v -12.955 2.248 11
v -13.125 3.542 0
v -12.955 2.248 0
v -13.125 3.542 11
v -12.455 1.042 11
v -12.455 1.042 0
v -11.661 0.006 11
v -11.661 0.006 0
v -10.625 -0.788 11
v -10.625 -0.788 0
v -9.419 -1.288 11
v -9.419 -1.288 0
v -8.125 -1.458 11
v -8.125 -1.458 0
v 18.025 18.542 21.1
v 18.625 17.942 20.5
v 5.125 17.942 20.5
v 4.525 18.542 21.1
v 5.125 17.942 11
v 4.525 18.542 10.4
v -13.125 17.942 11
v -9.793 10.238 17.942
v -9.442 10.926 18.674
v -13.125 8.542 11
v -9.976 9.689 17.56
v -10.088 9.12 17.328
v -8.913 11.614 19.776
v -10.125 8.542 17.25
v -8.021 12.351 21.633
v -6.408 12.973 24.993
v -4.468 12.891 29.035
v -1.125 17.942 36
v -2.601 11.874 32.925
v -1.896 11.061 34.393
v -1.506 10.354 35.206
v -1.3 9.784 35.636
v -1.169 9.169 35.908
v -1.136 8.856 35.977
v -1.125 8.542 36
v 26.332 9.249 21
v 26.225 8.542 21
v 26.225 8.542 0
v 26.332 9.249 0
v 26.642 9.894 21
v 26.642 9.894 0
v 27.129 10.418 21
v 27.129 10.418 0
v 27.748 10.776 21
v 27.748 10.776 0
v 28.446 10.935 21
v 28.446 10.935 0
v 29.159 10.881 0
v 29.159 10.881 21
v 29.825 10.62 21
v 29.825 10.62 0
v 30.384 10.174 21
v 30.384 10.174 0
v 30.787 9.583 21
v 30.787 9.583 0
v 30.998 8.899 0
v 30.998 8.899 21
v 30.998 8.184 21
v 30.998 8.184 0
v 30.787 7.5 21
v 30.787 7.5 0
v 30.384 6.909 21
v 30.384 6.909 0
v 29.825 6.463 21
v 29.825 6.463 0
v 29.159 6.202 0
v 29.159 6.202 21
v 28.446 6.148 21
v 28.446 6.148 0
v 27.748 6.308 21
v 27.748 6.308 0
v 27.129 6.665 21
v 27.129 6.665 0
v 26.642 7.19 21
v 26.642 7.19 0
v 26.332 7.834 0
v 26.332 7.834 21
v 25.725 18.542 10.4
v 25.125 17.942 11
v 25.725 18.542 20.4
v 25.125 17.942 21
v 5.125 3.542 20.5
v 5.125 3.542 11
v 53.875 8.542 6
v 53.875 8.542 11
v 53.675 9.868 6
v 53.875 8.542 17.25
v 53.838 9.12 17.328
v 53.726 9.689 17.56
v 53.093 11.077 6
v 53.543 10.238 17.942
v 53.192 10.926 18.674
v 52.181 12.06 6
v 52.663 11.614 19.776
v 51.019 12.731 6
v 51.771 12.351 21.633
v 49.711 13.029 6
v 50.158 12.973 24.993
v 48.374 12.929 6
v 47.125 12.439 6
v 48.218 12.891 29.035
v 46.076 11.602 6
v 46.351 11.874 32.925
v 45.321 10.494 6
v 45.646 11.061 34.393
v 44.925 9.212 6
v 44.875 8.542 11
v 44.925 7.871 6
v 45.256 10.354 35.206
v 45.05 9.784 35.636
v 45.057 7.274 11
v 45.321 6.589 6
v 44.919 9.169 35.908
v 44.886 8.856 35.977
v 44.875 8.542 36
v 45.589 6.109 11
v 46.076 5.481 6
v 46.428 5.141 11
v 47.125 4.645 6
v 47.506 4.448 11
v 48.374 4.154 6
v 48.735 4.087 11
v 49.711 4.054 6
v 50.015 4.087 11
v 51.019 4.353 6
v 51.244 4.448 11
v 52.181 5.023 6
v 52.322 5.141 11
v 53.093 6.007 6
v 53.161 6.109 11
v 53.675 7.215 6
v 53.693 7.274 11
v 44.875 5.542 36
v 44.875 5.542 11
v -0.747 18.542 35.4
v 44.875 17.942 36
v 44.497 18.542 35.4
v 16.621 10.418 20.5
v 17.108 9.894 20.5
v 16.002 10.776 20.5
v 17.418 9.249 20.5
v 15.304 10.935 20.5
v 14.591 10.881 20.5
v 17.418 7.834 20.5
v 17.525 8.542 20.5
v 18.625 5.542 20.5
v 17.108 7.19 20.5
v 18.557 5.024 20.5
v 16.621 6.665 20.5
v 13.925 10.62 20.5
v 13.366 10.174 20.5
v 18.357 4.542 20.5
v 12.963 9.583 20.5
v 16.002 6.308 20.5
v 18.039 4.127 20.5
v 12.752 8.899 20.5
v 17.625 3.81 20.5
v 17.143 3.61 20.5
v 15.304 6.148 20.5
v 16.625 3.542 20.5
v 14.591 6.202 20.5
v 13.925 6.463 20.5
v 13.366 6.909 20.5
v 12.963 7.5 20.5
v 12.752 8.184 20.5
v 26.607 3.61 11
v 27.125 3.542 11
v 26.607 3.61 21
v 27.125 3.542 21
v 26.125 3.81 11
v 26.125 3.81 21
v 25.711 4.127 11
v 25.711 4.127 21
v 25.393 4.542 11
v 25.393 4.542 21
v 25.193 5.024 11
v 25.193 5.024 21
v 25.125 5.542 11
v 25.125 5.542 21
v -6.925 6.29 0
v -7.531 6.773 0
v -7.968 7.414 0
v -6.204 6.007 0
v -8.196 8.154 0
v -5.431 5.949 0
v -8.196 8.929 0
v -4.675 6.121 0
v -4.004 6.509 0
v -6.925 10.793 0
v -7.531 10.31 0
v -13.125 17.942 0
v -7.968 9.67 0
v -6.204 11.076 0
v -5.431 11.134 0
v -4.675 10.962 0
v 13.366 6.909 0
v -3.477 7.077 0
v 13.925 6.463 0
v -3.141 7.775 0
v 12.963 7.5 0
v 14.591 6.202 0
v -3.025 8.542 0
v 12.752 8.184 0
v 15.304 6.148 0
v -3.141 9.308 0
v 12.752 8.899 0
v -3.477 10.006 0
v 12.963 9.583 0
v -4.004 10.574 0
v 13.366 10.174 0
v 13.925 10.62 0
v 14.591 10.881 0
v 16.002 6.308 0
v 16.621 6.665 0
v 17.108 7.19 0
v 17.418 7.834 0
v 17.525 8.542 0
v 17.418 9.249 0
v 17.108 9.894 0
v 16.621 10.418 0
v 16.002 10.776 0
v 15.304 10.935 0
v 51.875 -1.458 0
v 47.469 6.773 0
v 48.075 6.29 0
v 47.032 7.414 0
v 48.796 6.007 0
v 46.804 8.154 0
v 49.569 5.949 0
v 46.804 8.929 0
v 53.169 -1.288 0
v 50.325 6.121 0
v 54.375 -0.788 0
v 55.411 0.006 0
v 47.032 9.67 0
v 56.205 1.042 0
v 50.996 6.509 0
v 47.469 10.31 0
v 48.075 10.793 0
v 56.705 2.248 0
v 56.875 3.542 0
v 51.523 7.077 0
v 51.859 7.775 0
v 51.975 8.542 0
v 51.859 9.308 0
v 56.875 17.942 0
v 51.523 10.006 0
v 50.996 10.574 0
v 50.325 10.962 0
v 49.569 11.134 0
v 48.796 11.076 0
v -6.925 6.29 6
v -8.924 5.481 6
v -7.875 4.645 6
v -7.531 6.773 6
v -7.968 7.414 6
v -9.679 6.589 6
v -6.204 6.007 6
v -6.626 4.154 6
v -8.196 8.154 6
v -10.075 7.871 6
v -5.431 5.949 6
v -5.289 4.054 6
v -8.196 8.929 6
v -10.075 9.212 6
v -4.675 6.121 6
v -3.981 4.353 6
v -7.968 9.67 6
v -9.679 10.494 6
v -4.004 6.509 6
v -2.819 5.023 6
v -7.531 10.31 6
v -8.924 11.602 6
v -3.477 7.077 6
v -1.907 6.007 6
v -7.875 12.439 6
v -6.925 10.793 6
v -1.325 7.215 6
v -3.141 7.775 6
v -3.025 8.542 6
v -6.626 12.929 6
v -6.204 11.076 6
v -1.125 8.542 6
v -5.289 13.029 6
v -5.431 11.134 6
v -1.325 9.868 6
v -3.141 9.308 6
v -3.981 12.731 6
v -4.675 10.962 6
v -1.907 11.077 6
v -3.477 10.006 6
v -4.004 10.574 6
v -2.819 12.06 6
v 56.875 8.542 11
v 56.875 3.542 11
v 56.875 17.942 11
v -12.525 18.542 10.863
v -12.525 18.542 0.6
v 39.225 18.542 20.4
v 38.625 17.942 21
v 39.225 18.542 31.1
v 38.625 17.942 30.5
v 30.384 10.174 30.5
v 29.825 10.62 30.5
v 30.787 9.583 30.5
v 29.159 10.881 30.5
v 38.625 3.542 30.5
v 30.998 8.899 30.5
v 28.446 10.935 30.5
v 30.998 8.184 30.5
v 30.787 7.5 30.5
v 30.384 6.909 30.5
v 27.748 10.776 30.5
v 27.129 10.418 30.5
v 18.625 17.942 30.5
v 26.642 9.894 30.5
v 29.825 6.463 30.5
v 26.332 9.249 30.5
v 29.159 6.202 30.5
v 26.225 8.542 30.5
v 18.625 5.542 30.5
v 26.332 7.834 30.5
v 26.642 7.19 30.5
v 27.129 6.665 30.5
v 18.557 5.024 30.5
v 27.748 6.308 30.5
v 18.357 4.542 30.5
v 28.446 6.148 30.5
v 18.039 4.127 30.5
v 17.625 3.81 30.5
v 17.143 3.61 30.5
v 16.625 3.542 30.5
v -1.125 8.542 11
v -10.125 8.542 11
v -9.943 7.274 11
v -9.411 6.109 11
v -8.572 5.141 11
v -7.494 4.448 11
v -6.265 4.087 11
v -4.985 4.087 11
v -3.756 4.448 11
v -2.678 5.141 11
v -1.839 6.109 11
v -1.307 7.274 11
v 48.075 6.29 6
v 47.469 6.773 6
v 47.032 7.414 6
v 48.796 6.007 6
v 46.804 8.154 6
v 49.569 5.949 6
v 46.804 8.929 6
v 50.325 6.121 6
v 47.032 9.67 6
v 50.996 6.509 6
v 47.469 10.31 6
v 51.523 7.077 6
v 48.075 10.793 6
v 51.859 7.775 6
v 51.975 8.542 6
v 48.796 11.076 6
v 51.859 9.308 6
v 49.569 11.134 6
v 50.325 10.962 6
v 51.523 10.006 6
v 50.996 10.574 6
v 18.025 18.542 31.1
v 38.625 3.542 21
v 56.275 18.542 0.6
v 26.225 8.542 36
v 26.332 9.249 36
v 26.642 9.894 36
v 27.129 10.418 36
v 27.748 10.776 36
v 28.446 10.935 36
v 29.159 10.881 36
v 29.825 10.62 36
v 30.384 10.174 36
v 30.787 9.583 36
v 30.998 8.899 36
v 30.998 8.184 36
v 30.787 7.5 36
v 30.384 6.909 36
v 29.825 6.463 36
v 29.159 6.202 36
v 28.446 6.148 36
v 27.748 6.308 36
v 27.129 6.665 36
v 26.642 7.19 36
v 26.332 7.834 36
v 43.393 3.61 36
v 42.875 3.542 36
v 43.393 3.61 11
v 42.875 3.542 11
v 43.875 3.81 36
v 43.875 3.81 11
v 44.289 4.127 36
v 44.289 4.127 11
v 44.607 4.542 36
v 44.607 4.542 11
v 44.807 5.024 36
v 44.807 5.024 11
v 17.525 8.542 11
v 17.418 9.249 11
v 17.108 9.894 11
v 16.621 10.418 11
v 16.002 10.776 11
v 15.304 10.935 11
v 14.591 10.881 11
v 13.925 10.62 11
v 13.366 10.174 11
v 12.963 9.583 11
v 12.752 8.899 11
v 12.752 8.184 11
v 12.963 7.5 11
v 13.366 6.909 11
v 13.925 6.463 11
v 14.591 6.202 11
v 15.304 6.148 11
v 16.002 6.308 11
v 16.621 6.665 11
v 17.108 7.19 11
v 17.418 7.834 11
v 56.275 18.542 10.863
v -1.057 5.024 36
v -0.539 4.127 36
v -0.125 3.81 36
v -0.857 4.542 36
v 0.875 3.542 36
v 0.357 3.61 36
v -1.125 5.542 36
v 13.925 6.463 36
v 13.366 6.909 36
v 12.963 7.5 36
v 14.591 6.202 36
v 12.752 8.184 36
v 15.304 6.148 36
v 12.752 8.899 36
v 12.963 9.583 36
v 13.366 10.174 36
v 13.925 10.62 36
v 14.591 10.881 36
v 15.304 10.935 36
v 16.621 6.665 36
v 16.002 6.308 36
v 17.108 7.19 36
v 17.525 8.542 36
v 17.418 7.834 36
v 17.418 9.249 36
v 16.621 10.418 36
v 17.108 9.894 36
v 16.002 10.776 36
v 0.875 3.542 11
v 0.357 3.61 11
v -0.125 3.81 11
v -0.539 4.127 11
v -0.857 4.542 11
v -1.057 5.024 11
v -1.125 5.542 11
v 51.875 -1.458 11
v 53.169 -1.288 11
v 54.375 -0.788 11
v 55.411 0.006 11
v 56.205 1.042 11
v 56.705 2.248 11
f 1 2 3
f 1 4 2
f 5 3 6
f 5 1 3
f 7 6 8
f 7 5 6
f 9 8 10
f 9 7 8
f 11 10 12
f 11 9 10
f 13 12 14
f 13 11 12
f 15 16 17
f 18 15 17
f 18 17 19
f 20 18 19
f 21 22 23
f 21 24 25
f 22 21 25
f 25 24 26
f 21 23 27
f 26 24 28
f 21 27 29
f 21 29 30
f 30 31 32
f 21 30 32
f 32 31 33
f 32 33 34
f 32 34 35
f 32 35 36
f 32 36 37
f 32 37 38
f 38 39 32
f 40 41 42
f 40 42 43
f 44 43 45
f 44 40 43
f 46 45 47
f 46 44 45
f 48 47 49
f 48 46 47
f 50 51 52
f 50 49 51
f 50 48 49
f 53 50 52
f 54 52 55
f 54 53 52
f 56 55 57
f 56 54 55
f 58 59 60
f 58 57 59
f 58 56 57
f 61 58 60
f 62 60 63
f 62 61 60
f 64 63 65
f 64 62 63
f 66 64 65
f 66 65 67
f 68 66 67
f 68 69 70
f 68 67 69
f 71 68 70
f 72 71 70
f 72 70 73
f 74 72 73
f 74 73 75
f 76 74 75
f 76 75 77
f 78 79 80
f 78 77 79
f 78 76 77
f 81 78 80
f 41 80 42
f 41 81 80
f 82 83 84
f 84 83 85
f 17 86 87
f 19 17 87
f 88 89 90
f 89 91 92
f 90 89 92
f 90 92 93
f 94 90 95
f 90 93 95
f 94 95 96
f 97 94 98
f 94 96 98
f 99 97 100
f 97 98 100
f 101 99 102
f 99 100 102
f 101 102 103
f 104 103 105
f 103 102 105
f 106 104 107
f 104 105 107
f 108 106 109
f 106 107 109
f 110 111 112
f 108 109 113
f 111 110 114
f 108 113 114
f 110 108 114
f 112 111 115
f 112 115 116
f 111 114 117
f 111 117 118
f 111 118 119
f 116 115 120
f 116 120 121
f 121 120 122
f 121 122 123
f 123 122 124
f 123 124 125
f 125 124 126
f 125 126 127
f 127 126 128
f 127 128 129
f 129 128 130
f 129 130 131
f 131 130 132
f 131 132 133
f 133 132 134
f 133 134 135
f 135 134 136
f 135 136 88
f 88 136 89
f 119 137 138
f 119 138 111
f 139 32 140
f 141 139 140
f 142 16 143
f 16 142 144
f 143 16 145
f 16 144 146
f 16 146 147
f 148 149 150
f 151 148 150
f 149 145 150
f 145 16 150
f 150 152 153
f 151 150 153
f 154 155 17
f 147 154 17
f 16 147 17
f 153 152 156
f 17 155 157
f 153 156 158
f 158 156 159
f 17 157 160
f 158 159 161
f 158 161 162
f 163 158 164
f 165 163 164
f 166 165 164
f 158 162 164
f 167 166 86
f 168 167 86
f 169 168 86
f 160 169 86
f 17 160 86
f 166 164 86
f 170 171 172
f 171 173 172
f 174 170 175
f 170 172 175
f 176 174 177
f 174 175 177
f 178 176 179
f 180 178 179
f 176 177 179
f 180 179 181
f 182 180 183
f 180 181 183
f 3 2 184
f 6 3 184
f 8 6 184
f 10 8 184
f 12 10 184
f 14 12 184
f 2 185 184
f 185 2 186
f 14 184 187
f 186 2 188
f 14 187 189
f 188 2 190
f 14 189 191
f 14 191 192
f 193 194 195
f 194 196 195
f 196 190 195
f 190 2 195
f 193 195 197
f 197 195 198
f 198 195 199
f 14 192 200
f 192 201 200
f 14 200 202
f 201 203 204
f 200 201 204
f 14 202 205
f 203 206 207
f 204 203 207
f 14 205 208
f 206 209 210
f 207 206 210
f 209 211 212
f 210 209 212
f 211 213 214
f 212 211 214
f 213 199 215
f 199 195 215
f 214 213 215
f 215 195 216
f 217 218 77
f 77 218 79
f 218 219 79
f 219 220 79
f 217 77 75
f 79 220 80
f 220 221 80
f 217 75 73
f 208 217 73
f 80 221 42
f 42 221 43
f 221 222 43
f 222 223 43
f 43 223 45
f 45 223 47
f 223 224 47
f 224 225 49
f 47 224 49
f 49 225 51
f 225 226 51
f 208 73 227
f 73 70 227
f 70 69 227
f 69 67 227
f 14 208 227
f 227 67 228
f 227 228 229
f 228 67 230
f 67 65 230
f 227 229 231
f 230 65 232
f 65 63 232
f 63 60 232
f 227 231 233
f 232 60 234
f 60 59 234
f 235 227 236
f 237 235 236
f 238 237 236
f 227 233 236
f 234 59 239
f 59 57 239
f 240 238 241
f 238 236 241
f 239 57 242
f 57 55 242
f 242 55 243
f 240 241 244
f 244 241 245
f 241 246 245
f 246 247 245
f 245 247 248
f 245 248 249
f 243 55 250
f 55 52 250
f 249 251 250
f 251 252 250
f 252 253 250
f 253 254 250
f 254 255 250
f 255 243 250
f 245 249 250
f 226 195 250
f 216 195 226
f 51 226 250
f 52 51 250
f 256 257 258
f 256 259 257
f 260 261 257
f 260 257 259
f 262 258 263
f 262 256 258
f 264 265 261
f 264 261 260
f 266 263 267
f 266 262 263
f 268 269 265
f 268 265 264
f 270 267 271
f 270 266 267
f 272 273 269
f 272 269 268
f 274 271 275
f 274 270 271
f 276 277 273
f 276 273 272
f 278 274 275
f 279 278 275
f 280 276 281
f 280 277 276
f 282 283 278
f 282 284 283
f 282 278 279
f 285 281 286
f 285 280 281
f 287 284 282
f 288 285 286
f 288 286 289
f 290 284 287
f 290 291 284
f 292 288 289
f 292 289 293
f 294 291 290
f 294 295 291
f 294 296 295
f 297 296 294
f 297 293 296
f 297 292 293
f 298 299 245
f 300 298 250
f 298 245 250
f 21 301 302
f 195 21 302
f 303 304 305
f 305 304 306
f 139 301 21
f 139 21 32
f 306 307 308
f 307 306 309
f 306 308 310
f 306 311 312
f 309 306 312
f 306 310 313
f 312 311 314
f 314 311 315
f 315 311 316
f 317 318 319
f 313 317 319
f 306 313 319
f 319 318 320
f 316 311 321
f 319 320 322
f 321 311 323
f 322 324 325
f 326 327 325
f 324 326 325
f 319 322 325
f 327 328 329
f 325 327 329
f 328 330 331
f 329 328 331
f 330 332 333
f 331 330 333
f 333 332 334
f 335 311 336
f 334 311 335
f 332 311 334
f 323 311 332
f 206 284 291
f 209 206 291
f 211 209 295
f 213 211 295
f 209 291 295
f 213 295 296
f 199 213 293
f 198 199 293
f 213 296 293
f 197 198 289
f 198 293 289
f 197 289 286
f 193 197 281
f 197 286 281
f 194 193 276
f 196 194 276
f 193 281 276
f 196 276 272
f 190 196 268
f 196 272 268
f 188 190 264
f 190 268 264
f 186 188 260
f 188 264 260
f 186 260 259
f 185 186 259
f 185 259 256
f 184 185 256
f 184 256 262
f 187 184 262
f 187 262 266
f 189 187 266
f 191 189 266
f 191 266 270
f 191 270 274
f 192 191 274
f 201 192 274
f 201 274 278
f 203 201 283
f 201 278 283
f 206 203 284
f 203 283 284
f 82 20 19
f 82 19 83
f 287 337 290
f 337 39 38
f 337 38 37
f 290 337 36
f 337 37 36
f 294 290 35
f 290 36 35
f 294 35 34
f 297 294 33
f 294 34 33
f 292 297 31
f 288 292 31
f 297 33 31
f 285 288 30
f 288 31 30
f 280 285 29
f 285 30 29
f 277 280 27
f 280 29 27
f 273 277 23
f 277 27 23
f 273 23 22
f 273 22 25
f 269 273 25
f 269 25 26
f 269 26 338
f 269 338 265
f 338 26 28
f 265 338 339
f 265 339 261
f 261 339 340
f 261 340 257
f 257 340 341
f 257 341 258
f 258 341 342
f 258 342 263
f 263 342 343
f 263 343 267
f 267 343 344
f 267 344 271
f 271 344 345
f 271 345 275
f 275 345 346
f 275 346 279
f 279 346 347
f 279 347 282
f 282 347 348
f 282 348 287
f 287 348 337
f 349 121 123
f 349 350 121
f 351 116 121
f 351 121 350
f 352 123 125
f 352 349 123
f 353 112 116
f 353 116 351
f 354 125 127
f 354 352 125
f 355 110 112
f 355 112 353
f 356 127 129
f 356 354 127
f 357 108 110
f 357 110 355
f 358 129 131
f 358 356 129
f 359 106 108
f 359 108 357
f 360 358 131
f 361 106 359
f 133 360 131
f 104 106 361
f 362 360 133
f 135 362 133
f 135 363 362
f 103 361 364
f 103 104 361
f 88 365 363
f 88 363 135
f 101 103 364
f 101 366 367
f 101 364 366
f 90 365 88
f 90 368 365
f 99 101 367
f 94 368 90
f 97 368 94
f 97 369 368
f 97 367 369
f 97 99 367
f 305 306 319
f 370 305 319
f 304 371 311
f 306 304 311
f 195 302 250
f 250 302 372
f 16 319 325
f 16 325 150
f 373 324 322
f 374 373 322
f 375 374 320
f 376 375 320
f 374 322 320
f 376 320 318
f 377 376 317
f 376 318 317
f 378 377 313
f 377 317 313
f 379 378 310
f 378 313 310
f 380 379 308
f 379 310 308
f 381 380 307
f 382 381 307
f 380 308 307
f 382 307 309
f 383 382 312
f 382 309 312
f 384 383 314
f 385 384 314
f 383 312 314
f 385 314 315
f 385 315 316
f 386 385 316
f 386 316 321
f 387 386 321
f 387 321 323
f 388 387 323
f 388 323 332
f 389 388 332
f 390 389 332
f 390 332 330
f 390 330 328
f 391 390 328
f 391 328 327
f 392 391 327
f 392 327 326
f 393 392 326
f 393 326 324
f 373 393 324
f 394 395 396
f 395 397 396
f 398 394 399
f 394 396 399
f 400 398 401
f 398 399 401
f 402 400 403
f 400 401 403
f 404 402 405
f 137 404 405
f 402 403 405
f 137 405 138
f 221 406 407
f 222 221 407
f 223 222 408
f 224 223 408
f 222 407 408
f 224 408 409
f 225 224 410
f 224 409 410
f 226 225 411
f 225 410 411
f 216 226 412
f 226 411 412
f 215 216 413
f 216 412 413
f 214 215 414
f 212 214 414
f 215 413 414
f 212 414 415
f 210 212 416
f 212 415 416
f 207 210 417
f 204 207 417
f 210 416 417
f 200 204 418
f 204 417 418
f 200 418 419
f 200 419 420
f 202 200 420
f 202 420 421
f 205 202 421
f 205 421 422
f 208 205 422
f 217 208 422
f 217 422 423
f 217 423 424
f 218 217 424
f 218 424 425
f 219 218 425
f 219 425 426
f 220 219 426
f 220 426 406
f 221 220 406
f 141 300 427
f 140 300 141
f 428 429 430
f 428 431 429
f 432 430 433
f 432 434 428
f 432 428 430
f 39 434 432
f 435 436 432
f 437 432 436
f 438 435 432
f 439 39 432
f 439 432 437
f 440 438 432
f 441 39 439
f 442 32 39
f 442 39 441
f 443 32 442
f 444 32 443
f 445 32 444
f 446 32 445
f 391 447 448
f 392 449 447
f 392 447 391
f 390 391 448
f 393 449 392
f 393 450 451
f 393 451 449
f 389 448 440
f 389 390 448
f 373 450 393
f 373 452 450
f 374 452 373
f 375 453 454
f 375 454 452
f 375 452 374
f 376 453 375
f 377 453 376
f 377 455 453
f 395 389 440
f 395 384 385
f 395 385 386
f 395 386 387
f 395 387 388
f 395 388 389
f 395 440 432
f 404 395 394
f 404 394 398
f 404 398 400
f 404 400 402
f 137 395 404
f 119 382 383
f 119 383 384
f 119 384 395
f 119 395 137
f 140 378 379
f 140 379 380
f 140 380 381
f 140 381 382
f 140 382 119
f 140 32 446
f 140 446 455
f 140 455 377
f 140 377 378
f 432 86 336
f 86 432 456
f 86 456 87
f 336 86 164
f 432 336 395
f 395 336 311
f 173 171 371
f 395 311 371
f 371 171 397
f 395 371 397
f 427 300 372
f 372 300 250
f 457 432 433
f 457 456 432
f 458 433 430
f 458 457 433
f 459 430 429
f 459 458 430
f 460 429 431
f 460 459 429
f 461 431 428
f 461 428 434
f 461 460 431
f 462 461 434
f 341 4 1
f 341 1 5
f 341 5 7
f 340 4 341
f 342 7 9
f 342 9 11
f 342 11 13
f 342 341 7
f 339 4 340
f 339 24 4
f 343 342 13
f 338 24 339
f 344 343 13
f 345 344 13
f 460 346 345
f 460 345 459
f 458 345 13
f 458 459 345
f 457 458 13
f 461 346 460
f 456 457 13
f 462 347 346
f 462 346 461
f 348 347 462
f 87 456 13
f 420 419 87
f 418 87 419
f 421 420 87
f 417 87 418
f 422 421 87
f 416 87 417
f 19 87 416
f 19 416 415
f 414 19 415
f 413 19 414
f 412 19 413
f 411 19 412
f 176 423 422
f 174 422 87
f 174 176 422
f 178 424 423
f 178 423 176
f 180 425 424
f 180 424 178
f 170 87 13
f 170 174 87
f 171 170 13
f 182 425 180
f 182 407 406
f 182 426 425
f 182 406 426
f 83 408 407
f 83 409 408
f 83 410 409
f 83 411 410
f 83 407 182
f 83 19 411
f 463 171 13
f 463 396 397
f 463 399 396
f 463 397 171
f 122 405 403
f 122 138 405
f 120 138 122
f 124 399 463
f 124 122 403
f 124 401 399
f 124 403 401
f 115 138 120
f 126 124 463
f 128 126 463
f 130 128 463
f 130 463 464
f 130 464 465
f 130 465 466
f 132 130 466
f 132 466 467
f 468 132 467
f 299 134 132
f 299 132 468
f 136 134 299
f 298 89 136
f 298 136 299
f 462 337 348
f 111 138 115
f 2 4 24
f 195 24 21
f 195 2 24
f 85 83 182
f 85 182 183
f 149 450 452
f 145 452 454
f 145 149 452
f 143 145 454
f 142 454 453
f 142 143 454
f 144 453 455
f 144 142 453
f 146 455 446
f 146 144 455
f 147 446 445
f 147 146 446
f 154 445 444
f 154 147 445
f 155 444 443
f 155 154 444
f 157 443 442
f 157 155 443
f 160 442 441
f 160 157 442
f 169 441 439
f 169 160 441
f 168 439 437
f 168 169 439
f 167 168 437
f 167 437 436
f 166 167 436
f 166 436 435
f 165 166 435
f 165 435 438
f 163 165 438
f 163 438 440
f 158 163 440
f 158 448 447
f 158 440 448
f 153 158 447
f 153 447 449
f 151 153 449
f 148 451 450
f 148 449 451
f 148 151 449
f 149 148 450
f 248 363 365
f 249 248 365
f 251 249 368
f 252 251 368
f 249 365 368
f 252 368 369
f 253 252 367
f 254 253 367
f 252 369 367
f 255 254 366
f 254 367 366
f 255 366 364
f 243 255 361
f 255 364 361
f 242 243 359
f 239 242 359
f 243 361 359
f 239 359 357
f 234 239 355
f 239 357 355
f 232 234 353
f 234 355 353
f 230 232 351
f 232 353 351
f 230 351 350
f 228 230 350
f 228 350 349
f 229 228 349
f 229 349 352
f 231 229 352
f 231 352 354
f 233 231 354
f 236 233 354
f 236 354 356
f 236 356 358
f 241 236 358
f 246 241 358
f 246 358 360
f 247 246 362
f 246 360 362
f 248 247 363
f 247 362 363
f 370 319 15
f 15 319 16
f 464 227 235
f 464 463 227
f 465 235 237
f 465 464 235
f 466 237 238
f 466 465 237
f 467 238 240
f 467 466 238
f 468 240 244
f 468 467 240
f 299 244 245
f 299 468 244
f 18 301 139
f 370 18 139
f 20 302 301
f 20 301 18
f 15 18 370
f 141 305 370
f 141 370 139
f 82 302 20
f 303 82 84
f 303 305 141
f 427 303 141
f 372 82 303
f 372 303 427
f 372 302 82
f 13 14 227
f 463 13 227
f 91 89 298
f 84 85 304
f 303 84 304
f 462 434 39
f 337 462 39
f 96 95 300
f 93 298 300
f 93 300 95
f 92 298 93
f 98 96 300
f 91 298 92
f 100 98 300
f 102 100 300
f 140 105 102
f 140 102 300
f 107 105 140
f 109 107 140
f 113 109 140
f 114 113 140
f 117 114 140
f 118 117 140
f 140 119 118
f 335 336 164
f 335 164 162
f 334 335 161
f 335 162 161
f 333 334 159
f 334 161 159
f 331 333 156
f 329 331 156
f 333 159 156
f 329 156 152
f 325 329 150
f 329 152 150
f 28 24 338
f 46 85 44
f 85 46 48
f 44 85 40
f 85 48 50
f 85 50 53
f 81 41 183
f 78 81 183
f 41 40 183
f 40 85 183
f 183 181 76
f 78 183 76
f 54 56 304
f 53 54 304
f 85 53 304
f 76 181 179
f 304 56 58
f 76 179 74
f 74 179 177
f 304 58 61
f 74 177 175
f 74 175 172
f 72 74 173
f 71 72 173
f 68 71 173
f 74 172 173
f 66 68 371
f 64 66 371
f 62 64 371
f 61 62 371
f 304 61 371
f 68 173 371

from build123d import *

# Parameters (mm, degrees)
SKETCH_1_W               = 70
SKETCH_1_H               = 20
EXTRUDE_1_DEPTH          = 11
SKETCH_3_W               = 70
SKETCH_3_H               = 15
EXTRUDE_2_DEPTH          = 25
CUT_EXTRUDE_1_DEPTH      = 15
SKETCH_5_R               = 4.5
CUT_EXTRUDE_2_DEPTH      = 30
SKETCH_11_R              = 2.6
CUT_EXTRUDE_7_DEPTH      = 6
SKETCH_12_W              = 12
SKETCH_12_H              = 5
CUT_EXTRUDE_8_DEPTH      = 25
SKETCH_8_R               = 2.4
CUT_EXTRUDE_5_DEPTH      = 31.5
CUT_EXTRUDE_5_DEPTH_BACK = 6.5
SKETCH_10_R              = 2.4
CUT_EXTRUDE_6_DEPTH      = 26
CUT_EXTRUDE_6_DEPTH_BACK = 12
FILLET_1_R               = 5
CHAMFER_1_SIZE           = 0.6
FILLET_2_R               = 2


with BuildPart() as part:
    # 草图1 → 凸台-拉伸1 (new body)
    with BuildSketch(Plane.XY):
        with Locations((21.875, 8.541666667)):
            Rectangle(SKETCH_1_W, SKETCH_1_H)
    extrude(amount=EXTRUDE_1_DEPTH)

    # 草图3 → 凸台-拉伸2 (add)
    with BuildSketch(Plane.XY.offset(11)):
        with Locations((21.875, 11.041666667)):
            Rectangle(SKETCH_3_W, SKETCH_3_H)
    extrude(amount=EXTRUDE_2_DEPTH)

    # 草图4 → 切除-拉伸1 (cut)
    with BuildSketch(Plane.XZ.offset(-3.541666667)):
        Polygon((-13.125, 36), (-13.125, 11), (-1.125, 36), align=None)
        Polygon((56.875, 11), (44.875, 36), (56.875, 36), align=None)
        Polygon((5.125, 11), (25.125, 11), (25.125, 21), (38.625, 21), (38.625, 30.5), (18.625, 30.5), (18.625, 21), (18.625, 20.5), (5.125, 20.5), align=None)
    extrude(amount=-CUT_EXTRUDE_1_DEPTH, mode=Mode.SUBTRACT)

    # 草图5 → 切除-拉伸2 (cut)
    with BuildSketch(Plane.XY.offset(36)):
        with Locations((-5.625, 8.541666667)):
            Circle(SKETCH_5_R)
        with Locations((49.375, 8.541666667)):
            Circle(SKETCH_5_R)
    extrude(amount=-CUT_EXTRUDE_2_DEPTH, mode=Mode.SUBTRACT)

    # 草图11 → 切除-拉伸7 (cut)
    with BuildSketch(Plane.XY.offset(6)):
        with Locations((-5.625, 8.541666667)):
            Circle(SKETCH_11_R)
        with Locations((49.375, 8.541666667)):
            Circle(SKETCH_11_R)
    extrude(amount=-CUT_EXTRUDE_7_DEPTH, mode=Mode.SUBTRACT)

    # 草图12 → 切除-拉伸8 (cut)
    with BuildSketch(Plane.XY.offset(36)):
        with Locations((-7.125, 6.041666667)):
            Rectangle(SKETCH_12_W, SKETCH_12_H)
        with Locations((50.875, 6.041666667)):
            Rectangle(SKETCH_12_W, SKETCH_12_H)
    extrude(amount=-CUT_EXTRUDE_8_DEPTH, mode=Mode.SUBTRACT)

    # 草图8 → 切除-拉伸5 (cut, two sides)
    with BuildSketch(Plane(origin=(0, 0, 30.5), x_dir=(-1, 0, 0), z_dir=(0, 0, -1))) as cut_extrude_5_sk:
        with Locations((-28.625, 8.541666667)):
            Circle(SKETCH_8_R)
    extrude(amount=CUT_EXTRUDE_5_DEPTH, mode=Mode.SUBTRACT)
    extrude(cut_extrude_5_sk.sketch, amount=-CUT_EXTRUDE_5_DEPTH_BACK, mode=Mode.SUBTRACT)

    # 草图10 → 切除-拉伸6 (cut, two sides)
    with BuildSketch(Plane.XY.offset(11)) as cut_extrude_6_sk:
        with Locations((15.125, 8.541666667)):
            Circle(SKETCH_10_R)
    extrude(amount=CUT_EXTRUDE_6_DEPTH, mode=Mode.SUBTRACT)
    extrude(cut_extrude_6_sk.sketch, amount=-CUT_EXTRUDE_6_DEPTH_BACK, mode=Mode.SUBTRACT)

    # 圆角1
    fillet_1_edges = [part.edges().sort_by_distance(p)[0] for p in [
        (56.875, -1.458333333, 5.5),
        (-13.125, -1.458333333, 5.5),
    ]]
    fillet(fillet_1_edges, radius=FILLET_1_R)

    # 倒角1
    chamfer_1_edges = [part.edges().sort_by_distance(p)[0] for p in [
        (21.875, 18.541666667, 36),
        (-13.125, 18.541666667, 5.5),
        (56.875, 18.541666667, 5.5),
        (-7.125, 18.541666667, 23.5),
        (50.875, 18.541666667, 23.5),
        (5.125, 18.541666667, 15.75),
        (11.875, 18.541666667, 20.5),
        (18.625, 18.541666667, 25.5),
        (21.875, 18.541666667, 0),
        (28.625, 18.541666667, 30.5),
        (38.625, 18.541666667, 25.75),
        (31.875, 18.541666667, 21),
        (25.125, 18.541666667, 16),
        (15.125, 18.541666667, 11),
    ]]
    chamfer(chamfer_1_edges, length=CHAMFER_1_SIZE)

    # 圆角2
    fillet_2_edges = [part.edges().sort_by_distance(p)[0] for p in [
        (-1.125, 3.541666667, 23.5),
        (44.875, 3.541666667, 23.5),
        (25.125, 3.541666667, 16),
        (18.625, 3.541666667, 25.5),
    ]]
    fillet(fillet_2_edges, radius=FILLET_2_R)


solid = part.part
